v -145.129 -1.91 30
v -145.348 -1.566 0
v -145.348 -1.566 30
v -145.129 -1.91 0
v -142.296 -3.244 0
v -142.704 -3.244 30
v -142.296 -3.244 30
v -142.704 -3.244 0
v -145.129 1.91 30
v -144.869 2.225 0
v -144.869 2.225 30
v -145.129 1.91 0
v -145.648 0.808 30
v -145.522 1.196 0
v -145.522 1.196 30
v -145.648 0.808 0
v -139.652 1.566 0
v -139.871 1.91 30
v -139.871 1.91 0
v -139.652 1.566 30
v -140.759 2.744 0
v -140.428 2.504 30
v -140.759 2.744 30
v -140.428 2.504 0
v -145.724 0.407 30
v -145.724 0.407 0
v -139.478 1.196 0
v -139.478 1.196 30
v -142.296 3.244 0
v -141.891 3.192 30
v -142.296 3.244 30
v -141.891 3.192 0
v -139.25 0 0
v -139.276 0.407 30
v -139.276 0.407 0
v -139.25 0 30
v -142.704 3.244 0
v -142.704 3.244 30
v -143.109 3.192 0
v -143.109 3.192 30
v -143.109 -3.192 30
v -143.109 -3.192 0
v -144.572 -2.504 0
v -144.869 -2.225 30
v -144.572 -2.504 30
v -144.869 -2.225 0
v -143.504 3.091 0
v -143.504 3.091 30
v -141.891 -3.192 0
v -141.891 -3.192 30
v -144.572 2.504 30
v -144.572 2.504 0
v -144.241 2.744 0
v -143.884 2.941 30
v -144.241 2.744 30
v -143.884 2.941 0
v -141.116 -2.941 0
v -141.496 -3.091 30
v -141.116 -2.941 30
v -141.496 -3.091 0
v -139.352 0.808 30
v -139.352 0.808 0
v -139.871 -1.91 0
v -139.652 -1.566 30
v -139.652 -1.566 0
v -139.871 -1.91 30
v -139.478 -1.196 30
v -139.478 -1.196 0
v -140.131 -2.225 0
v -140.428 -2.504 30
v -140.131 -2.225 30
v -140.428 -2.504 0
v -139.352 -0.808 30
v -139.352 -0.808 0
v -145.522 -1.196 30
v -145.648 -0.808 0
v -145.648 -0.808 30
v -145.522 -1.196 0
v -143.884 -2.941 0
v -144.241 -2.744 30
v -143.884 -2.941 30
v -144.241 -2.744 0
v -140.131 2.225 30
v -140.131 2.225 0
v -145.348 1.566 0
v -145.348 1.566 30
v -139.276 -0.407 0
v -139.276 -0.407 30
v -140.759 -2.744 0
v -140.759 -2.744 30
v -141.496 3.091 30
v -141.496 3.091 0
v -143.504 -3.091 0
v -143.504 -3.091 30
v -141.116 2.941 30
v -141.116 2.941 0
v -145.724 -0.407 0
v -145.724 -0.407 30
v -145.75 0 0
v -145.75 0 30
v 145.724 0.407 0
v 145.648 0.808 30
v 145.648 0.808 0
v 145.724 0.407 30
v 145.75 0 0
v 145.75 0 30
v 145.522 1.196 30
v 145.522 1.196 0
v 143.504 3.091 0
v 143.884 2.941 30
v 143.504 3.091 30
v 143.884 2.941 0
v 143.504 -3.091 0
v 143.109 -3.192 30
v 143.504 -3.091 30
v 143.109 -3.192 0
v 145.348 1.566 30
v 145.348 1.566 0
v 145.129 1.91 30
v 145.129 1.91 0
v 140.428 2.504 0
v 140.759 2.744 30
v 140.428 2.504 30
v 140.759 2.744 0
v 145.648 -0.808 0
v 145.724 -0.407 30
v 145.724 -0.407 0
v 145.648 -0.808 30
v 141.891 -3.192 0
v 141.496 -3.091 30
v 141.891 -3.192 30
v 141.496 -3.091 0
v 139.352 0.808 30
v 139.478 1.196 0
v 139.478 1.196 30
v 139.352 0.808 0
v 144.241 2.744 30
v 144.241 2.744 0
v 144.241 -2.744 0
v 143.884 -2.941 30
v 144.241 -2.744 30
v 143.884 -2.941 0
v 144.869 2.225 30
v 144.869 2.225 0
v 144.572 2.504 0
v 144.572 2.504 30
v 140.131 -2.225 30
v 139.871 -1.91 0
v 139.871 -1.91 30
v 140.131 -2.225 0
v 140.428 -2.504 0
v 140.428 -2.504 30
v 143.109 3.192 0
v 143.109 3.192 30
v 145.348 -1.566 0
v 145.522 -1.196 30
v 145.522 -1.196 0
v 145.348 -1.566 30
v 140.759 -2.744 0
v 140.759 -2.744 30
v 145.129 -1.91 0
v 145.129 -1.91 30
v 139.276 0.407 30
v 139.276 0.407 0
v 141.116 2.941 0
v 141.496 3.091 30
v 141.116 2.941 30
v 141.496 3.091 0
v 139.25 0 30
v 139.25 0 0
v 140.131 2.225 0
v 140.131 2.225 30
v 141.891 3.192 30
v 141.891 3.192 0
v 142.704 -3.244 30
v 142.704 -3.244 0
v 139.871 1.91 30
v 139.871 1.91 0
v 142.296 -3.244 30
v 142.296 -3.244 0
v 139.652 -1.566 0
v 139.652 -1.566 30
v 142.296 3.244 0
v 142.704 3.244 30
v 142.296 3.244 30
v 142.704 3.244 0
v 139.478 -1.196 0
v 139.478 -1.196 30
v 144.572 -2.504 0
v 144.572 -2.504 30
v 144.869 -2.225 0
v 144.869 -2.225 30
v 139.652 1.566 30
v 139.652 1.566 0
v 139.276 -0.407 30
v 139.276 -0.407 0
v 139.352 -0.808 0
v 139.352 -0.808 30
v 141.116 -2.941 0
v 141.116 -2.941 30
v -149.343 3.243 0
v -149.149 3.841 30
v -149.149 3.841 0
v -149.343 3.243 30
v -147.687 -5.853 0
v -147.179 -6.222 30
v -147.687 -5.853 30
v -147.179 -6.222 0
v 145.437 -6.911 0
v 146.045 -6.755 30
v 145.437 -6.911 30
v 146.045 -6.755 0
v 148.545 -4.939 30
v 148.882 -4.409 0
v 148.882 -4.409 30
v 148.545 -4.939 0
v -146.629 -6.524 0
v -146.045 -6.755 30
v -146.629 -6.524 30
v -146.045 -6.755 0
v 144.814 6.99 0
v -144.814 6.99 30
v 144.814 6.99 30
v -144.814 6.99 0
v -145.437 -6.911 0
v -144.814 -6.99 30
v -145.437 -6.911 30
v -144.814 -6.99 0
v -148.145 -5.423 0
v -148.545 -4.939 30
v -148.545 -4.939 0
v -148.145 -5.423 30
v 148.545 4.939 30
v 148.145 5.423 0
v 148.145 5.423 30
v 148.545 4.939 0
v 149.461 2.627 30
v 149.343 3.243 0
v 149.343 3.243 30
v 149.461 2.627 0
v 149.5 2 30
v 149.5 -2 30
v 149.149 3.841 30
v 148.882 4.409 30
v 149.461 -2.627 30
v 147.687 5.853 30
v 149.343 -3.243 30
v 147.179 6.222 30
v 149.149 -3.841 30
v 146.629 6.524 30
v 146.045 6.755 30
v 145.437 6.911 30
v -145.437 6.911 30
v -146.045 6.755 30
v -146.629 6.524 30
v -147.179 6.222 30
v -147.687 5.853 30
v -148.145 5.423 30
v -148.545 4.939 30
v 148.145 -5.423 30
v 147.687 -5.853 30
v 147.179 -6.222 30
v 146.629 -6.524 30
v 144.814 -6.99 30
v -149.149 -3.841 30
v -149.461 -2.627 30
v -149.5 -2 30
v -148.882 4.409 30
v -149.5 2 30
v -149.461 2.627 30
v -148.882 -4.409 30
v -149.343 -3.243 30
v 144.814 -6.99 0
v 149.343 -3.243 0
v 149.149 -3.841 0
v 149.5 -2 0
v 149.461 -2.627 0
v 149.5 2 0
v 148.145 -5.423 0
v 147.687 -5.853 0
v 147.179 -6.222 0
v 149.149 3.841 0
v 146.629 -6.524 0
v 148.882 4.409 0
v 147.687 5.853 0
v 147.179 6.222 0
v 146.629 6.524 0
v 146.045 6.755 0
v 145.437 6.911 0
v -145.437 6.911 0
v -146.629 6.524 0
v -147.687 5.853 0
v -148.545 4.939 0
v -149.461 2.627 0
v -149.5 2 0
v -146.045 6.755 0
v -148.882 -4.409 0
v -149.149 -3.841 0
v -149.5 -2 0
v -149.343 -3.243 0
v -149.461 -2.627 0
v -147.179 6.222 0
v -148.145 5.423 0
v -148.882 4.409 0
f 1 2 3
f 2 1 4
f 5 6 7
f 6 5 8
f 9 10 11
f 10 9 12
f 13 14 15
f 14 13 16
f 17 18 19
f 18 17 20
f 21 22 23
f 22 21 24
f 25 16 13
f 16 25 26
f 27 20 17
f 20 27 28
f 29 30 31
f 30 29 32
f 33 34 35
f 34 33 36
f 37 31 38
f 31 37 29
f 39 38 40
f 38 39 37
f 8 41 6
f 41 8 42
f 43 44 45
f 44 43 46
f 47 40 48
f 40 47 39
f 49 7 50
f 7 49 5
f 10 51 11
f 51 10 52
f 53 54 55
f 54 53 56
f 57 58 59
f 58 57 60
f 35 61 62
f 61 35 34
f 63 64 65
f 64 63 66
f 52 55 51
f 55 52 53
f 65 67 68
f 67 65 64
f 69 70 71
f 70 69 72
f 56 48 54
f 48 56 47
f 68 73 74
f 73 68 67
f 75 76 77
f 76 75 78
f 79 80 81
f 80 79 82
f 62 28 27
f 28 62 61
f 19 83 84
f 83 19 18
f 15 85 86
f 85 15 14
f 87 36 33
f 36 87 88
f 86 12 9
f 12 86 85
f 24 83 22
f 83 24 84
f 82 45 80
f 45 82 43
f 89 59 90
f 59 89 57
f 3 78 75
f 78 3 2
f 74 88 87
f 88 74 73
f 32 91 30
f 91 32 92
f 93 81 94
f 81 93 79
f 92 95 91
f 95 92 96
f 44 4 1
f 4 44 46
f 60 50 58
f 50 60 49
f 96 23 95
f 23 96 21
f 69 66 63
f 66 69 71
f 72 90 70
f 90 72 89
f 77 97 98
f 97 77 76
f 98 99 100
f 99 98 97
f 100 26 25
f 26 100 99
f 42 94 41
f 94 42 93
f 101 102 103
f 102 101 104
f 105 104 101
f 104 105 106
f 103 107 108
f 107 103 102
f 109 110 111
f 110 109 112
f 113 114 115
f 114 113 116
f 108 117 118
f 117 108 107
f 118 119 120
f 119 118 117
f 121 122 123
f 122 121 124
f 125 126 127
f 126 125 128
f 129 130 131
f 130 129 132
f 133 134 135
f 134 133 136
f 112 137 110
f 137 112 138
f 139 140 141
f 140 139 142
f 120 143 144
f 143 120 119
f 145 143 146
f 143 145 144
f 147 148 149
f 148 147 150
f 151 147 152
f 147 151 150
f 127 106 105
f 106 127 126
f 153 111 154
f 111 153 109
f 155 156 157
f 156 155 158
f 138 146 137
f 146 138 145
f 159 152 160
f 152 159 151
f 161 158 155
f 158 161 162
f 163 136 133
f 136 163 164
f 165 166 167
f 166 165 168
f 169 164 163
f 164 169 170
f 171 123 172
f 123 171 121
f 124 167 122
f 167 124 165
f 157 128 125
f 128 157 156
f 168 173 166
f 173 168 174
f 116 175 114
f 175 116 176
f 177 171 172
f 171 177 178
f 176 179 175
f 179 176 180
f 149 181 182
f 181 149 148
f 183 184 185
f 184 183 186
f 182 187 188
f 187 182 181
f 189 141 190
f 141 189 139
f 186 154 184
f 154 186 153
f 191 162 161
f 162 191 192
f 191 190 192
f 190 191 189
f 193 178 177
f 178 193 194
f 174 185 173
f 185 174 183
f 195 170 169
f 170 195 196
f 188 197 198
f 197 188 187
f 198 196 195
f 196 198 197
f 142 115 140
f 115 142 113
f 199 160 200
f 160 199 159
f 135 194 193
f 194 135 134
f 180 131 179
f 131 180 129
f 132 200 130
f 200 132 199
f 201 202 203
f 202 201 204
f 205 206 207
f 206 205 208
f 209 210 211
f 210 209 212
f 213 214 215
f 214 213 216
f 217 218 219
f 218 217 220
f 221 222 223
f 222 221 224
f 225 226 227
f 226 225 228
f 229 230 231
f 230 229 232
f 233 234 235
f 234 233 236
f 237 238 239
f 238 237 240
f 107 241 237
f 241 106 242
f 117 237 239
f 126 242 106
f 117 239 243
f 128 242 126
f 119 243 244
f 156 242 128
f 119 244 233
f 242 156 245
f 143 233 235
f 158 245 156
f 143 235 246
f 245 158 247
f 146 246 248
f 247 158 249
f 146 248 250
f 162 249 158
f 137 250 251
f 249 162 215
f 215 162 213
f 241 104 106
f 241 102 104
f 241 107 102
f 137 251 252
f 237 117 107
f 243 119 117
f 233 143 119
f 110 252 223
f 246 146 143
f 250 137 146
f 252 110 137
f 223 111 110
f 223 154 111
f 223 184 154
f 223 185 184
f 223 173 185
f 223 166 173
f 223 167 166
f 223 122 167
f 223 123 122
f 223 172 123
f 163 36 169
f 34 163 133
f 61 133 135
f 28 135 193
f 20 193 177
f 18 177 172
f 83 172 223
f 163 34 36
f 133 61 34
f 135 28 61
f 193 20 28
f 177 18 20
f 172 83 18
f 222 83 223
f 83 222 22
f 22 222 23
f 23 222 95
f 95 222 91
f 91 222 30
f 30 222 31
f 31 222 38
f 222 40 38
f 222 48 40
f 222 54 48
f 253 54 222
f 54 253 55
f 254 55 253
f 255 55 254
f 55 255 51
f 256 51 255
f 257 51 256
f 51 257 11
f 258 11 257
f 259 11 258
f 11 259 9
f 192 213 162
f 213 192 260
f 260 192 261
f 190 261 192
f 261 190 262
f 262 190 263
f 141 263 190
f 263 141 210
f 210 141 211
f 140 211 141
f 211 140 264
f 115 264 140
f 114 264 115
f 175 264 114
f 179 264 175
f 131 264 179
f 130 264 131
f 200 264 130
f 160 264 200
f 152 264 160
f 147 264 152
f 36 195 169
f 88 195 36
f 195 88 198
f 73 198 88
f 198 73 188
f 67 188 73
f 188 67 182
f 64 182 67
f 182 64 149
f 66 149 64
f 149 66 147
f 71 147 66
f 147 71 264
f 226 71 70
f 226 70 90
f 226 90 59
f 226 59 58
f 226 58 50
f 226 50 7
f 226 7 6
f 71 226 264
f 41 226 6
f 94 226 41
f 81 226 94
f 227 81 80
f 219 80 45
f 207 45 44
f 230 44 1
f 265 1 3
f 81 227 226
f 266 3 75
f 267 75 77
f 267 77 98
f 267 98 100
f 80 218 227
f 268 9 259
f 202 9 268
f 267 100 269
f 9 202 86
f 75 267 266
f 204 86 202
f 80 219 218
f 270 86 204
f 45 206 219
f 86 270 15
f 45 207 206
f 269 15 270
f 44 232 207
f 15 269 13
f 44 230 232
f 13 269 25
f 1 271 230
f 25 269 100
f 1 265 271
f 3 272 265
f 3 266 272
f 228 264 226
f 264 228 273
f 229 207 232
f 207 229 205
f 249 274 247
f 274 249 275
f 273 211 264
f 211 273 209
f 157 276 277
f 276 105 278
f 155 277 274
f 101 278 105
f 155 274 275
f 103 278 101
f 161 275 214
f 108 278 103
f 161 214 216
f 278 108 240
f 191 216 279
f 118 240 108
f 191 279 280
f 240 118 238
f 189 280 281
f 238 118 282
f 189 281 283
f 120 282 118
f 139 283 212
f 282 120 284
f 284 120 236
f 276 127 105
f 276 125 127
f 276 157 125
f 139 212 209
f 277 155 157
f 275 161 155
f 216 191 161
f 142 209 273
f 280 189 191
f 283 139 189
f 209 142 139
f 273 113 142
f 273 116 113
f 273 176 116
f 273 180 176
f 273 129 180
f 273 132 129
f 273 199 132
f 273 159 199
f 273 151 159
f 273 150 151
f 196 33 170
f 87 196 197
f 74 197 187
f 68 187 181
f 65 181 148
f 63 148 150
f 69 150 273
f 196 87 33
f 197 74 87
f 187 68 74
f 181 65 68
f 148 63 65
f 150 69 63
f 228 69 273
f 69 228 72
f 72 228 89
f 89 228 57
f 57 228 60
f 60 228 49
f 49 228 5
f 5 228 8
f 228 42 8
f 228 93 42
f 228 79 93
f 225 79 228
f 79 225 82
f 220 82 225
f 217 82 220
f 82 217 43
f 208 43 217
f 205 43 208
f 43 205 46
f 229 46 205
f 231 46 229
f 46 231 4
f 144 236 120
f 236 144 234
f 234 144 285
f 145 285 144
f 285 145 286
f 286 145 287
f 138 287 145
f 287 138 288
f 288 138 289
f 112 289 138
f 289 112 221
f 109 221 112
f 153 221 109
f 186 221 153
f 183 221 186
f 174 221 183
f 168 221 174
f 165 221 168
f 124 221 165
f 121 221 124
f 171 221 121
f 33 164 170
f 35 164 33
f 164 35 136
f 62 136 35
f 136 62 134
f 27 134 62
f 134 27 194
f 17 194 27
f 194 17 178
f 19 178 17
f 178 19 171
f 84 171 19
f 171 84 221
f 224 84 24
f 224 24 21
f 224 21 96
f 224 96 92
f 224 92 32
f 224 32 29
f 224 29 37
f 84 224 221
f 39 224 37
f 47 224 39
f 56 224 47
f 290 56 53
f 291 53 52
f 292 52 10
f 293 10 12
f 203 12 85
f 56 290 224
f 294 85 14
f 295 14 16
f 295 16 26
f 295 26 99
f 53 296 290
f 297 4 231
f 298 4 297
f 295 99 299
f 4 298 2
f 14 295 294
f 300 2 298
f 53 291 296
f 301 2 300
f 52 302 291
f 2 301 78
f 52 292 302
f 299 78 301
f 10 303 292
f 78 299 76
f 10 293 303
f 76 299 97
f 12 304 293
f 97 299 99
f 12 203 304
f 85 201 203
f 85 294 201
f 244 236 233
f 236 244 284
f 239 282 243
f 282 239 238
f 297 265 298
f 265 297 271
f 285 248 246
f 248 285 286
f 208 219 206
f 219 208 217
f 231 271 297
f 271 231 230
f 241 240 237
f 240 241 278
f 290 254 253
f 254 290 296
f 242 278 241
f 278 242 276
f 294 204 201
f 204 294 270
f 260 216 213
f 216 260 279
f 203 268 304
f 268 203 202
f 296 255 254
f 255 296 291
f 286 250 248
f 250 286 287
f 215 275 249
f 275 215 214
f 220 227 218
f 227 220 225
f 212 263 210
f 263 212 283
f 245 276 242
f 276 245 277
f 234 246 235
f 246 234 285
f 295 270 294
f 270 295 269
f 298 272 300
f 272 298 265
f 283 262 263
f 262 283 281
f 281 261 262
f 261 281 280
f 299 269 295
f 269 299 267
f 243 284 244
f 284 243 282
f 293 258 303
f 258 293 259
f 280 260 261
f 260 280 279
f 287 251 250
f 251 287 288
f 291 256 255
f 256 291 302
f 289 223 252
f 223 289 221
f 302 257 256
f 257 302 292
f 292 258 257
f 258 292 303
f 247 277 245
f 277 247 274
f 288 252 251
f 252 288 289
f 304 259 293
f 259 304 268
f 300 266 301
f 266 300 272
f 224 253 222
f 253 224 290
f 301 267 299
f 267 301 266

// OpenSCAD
$fn = 50;


difference() {
	union() {
		hull() {
			translate(v = [-144.5000000000, 2.0000000000, 0]) {
				cylinder(h = 30, r = 5);
			}
			translate(v = [144.5000000000, 2.0000000000, 0]) {
				cylinder(h = 30, r = 5);
			}
			translate(v = [-144.5000000000, -2.0000000000, 0]) {
				cylinder(h = 30, r = 5);
			}
			translate(v = [144.5000000000, -2.0000000000, 0]) {
				cylinder(h = 30, r = 5);
			}
		}
	}
	union() {
		translate(v = [-142.5000000000, 0.0000000000, -100.0000000000]) {
			cylinder(h = 200, r = 3.2500000000);
		}
		translate(v = [-142.5000000000, 0.0000000000, -100.0000000000]) {
			cylinder(h = 200, r = 3.2500000000);
		}
		translate(v = [142.5000000000, 0.0000000000, -100.0000000000]) {
			cylinder(h = 200, r = 3.2500000000);
		}
		translate(v = [142.5000000000, 0.0000000000, -100.0000000000]) {
			cylinder(h = 200, r = 3.2500000000);
		}
	}
}
